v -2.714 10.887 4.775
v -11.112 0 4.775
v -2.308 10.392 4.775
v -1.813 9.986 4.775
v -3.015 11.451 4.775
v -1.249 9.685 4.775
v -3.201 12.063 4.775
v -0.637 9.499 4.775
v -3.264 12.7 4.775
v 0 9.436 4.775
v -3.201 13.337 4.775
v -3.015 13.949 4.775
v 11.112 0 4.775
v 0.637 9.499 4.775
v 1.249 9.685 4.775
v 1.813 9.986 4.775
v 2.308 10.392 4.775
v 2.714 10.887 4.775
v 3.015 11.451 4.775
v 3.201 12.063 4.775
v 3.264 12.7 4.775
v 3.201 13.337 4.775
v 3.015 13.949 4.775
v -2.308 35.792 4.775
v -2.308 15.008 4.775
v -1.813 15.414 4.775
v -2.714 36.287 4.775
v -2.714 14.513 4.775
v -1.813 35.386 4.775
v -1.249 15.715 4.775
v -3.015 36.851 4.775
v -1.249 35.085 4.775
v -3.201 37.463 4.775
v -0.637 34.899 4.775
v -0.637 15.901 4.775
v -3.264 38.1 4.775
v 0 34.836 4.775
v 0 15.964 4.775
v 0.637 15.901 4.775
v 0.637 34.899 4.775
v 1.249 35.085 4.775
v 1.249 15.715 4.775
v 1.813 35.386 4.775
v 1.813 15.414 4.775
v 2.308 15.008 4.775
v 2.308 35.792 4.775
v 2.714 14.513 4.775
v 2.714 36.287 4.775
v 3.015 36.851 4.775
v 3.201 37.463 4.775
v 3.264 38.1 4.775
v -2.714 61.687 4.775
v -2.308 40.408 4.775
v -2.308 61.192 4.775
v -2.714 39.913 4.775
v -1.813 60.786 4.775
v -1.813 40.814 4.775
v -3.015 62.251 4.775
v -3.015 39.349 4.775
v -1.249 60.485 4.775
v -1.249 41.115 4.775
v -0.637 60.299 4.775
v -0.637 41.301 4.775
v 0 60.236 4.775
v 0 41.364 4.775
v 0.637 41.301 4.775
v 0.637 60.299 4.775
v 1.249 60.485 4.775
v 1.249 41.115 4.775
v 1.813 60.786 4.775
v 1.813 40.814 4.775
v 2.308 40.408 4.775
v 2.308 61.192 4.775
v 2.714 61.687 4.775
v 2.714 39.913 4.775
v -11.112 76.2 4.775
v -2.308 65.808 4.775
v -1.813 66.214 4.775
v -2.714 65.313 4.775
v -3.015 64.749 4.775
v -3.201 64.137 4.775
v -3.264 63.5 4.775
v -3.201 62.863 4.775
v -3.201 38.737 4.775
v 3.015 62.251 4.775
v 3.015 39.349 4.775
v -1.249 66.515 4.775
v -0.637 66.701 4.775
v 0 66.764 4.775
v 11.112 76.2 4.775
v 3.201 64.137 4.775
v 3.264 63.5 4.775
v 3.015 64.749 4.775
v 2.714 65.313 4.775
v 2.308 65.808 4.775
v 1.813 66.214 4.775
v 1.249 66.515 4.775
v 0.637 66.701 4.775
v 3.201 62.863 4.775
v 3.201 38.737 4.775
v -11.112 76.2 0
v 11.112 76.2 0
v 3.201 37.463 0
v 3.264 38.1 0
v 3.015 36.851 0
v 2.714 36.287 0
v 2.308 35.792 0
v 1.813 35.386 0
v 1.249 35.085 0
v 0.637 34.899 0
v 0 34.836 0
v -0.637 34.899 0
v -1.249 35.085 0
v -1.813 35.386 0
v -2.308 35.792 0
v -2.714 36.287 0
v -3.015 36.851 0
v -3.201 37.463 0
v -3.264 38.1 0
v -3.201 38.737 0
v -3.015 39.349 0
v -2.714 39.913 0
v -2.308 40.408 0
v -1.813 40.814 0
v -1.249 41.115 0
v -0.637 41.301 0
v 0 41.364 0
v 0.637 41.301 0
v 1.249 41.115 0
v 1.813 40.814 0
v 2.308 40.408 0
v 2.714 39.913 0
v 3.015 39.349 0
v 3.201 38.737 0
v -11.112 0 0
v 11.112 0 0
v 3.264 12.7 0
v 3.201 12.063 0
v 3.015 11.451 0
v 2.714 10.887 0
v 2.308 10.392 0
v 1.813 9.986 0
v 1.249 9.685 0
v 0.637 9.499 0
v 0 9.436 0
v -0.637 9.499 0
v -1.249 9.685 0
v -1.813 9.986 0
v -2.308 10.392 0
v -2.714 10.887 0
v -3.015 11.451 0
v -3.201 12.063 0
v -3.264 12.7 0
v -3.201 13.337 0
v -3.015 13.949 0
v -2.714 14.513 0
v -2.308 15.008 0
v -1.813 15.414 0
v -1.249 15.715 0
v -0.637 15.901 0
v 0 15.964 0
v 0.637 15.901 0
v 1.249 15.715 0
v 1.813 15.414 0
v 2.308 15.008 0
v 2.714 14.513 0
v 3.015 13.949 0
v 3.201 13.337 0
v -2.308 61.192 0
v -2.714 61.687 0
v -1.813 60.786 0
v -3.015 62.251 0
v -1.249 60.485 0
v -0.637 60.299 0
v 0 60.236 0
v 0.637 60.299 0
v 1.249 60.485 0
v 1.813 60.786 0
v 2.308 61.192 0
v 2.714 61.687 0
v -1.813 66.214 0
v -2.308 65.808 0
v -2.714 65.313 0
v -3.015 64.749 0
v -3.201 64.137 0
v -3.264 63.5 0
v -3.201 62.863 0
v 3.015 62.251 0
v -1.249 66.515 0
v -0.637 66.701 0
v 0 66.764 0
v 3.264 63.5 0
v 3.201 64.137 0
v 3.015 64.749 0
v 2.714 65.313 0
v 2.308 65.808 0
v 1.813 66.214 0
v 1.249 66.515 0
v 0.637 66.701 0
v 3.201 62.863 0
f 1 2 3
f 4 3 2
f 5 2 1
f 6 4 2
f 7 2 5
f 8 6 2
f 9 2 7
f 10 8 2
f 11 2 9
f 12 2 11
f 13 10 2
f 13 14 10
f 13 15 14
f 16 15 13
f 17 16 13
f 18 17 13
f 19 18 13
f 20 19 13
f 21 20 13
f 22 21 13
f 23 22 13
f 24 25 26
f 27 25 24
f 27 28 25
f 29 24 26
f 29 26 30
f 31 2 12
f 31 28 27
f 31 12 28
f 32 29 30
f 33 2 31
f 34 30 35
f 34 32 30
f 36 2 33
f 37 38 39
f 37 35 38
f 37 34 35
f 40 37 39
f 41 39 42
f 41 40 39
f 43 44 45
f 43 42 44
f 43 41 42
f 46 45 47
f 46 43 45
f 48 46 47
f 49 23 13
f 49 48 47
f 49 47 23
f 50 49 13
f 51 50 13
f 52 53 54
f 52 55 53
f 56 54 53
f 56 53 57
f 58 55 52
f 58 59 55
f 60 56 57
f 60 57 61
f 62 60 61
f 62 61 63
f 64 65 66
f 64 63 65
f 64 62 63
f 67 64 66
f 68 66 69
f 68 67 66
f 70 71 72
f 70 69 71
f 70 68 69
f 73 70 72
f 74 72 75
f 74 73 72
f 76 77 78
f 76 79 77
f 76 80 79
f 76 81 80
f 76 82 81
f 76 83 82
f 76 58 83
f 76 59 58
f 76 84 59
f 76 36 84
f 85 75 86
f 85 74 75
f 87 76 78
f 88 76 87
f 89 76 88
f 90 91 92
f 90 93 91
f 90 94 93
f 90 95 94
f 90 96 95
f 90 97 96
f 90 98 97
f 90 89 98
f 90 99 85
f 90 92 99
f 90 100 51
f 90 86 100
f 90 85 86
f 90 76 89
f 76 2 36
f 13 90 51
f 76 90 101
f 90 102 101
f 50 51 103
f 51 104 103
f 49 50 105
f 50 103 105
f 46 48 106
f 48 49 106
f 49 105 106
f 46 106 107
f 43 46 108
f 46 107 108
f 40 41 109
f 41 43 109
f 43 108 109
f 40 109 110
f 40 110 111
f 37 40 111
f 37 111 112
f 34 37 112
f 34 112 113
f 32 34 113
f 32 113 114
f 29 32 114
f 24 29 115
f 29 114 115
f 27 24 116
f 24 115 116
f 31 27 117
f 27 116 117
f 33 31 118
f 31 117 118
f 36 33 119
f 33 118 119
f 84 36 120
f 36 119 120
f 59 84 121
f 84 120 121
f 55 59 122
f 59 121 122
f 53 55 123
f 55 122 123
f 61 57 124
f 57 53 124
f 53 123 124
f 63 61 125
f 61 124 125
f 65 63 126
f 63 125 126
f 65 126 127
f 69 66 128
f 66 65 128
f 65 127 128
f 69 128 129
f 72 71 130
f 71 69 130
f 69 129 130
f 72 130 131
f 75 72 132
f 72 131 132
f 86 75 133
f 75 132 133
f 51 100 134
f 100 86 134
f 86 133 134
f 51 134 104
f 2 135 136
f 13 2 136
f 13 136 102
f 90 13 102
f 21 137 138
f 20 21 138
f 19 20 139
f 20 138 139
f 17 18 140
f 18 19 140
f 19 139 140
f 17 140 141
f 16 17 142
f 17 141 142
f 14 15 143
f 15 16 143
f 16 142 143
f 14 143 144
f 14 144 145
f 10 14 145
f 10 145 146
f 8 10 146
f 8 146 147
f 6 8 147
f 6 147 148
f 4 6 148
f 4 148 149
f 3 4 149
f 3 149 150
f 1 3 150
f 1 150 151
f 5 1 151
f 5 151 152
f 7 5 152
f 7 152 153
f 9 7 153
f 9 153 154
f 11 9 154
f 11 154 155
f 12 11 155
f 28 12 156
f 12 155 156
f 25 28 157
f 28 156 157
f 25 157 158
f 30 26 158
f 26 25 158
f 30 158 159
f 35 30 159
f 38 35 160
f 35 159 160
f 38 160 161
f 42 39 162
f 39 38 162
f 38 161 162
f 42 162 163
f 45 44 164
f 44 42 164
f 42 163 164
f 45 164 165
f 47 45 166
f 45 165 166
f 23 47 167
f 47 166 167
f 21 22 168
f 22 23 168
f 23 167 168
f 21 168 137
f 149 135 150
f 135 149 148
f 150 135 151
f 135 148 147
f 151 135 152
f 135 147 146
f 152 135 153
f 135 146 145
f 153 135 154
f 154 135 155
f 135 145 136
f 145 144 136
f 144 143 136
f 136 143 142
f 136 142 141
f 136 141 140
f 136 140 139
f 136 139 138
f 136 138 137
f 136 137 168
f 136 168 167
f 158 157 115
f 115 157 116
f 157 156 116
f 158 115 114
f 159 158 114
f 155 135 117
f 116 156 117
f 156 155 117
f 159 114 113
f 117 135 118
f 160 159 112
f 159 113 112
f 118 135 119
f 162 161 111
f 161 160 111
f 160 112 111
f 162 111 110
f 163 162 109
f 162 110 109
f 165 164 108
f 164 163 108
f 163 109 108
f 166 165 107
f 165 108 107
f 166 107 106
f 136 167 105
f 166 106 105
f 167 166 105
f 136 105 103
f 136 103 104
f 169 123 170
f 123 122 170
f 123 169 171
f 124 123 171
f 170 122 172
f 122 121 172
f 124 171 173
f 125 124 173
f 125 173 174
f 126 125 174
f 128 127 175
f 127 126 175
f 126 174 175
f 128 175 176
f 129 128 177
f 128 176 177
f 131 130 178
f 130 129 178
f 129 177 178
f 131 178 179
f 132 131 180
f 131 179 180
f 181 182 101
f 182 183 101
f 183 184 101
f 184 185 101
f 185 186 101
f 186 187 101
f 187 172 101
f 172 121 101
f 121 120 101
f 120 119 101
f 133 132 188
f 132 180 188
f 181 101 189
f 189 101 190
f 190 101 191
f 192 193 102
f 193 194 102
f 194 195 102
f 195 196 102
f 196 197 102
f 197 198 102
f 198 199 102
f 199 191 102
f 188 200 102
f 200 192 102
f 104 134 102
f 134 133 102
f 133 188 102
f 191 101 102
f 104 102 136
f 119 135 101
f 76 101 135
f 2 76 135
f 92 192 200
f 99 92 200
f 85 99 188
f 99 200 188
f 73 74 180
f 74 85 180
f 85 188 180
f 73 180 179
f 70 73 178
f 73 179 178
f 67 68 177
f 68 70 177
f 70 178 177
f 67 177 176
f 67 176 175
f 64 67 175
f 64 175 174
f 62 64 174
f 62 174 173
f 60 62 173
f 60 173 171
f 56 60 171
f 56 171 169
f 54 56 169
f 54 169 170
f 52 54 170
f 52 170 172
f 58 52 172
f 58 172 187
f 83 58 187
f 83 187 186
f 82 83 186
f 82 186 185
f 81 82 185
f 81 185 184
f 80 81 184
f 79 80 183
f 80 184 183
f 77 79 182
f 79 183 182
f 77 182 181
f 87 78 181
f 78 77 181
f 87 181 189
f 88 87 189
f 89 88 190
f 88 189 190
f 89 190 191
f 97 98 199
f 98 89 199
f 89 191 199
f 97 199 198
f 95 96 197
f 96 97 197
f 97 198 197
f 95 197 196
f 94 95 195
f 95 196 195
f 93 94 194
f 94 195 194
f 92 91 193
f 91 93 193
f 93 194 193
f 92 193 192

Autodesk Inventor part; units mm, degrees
ref_plane "YZ Plane" through (0, 0, 0) normal (1, 0, 0) x (0, 1, 0)
ref_plane "XZ Plane" through (0, 0, 0) normal (0, 1, 0) x (-1, 0, 0)
ref_plane "XY Plane" through (0, 0, 0) normal (0, 0, 1) x (1, 0, 0)
sketch "Sketch_1" plane through (0, 0, 0) normal (0, 0, 1) x (1, 0, 0)
  line L0 (-11.1125, 76.2) -> (-11.1125, 0)
  line L1 (-11.1125, 0) -> (11.1125, 0)
  line L2 (11.1125, 0) -> (11.1125, 76.2)
  line L3 (11.1125, 76.2) -> (-11.1125, 76.2)
  circle A0 centre (0, 12.7) radius 3.2639
  circle A1 centre (0, 38.1) radius 3.2639
  circle A2 centre (0, 63.5) radius 3.2639
extrude "Extrusion1" add sketch "Sketch_1" along normal blind 4.7752
properties part number "4118"
